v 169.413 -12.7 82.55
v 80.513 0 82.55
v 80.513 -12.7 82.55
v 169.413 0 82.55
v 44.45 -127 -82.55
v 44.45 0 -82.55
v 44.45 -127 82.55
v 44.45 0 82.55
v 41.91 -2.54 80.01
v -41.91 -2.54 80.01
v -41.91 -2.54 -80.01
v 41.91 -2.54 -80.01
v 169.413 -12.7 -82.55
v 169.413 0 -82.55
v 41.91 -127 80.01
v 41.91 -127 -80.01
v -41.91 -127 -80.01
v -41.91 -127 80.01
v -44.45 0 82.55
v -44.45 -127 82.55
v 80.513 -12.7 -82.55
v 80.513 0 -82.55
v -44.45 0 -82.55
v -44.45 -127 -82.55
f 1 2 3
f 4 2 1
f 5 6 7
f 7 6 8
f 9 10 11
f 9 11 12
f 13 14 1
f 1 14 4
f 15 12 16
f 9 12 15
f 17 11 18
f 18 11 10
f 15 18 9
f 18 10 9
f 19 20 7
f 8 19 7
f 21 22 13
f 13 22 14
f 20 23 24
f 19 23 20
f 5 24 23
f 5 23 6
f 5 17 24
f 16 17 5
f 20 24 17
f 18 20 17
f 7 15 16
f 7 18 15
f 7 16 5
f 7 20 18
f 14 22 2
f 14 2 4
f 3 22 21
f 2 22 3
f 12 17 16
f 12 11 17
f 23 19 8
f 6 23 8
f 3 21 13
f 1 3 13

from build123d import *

# Parameters (mm, degrees)
F0_W     = 88.9
F0_H     = 165.1
F1_DEPTH = 127
F2_DEPTH = 12.7
F3_T     = -2.54


with BuildPart() as f1:
    # F0 (on Front) → F1 (new body)
    with BuildSketch(Plane.XZ):
        Rectangle(F0_W, F0_H)
    extrude(amount=F1_DEPTH)

    # F3
    f3_openings = [f1.faces().sort_by_distance(p)[0] for p in [
        (0, -127, 0),
    ]]
    offset(amount=F3_T, openings=f3_openings)


with BuildPart() as f2:
    # F0 (on Front) → F2 (new body)
    with BuildSketch(Plane.XZ):
        with Locations((124.963214, 0)):
            Rectangle(F0_W, F0_H)
    extrude(amount=F2_DEPTH)


solid = Compound([f1.part, f2.part])
